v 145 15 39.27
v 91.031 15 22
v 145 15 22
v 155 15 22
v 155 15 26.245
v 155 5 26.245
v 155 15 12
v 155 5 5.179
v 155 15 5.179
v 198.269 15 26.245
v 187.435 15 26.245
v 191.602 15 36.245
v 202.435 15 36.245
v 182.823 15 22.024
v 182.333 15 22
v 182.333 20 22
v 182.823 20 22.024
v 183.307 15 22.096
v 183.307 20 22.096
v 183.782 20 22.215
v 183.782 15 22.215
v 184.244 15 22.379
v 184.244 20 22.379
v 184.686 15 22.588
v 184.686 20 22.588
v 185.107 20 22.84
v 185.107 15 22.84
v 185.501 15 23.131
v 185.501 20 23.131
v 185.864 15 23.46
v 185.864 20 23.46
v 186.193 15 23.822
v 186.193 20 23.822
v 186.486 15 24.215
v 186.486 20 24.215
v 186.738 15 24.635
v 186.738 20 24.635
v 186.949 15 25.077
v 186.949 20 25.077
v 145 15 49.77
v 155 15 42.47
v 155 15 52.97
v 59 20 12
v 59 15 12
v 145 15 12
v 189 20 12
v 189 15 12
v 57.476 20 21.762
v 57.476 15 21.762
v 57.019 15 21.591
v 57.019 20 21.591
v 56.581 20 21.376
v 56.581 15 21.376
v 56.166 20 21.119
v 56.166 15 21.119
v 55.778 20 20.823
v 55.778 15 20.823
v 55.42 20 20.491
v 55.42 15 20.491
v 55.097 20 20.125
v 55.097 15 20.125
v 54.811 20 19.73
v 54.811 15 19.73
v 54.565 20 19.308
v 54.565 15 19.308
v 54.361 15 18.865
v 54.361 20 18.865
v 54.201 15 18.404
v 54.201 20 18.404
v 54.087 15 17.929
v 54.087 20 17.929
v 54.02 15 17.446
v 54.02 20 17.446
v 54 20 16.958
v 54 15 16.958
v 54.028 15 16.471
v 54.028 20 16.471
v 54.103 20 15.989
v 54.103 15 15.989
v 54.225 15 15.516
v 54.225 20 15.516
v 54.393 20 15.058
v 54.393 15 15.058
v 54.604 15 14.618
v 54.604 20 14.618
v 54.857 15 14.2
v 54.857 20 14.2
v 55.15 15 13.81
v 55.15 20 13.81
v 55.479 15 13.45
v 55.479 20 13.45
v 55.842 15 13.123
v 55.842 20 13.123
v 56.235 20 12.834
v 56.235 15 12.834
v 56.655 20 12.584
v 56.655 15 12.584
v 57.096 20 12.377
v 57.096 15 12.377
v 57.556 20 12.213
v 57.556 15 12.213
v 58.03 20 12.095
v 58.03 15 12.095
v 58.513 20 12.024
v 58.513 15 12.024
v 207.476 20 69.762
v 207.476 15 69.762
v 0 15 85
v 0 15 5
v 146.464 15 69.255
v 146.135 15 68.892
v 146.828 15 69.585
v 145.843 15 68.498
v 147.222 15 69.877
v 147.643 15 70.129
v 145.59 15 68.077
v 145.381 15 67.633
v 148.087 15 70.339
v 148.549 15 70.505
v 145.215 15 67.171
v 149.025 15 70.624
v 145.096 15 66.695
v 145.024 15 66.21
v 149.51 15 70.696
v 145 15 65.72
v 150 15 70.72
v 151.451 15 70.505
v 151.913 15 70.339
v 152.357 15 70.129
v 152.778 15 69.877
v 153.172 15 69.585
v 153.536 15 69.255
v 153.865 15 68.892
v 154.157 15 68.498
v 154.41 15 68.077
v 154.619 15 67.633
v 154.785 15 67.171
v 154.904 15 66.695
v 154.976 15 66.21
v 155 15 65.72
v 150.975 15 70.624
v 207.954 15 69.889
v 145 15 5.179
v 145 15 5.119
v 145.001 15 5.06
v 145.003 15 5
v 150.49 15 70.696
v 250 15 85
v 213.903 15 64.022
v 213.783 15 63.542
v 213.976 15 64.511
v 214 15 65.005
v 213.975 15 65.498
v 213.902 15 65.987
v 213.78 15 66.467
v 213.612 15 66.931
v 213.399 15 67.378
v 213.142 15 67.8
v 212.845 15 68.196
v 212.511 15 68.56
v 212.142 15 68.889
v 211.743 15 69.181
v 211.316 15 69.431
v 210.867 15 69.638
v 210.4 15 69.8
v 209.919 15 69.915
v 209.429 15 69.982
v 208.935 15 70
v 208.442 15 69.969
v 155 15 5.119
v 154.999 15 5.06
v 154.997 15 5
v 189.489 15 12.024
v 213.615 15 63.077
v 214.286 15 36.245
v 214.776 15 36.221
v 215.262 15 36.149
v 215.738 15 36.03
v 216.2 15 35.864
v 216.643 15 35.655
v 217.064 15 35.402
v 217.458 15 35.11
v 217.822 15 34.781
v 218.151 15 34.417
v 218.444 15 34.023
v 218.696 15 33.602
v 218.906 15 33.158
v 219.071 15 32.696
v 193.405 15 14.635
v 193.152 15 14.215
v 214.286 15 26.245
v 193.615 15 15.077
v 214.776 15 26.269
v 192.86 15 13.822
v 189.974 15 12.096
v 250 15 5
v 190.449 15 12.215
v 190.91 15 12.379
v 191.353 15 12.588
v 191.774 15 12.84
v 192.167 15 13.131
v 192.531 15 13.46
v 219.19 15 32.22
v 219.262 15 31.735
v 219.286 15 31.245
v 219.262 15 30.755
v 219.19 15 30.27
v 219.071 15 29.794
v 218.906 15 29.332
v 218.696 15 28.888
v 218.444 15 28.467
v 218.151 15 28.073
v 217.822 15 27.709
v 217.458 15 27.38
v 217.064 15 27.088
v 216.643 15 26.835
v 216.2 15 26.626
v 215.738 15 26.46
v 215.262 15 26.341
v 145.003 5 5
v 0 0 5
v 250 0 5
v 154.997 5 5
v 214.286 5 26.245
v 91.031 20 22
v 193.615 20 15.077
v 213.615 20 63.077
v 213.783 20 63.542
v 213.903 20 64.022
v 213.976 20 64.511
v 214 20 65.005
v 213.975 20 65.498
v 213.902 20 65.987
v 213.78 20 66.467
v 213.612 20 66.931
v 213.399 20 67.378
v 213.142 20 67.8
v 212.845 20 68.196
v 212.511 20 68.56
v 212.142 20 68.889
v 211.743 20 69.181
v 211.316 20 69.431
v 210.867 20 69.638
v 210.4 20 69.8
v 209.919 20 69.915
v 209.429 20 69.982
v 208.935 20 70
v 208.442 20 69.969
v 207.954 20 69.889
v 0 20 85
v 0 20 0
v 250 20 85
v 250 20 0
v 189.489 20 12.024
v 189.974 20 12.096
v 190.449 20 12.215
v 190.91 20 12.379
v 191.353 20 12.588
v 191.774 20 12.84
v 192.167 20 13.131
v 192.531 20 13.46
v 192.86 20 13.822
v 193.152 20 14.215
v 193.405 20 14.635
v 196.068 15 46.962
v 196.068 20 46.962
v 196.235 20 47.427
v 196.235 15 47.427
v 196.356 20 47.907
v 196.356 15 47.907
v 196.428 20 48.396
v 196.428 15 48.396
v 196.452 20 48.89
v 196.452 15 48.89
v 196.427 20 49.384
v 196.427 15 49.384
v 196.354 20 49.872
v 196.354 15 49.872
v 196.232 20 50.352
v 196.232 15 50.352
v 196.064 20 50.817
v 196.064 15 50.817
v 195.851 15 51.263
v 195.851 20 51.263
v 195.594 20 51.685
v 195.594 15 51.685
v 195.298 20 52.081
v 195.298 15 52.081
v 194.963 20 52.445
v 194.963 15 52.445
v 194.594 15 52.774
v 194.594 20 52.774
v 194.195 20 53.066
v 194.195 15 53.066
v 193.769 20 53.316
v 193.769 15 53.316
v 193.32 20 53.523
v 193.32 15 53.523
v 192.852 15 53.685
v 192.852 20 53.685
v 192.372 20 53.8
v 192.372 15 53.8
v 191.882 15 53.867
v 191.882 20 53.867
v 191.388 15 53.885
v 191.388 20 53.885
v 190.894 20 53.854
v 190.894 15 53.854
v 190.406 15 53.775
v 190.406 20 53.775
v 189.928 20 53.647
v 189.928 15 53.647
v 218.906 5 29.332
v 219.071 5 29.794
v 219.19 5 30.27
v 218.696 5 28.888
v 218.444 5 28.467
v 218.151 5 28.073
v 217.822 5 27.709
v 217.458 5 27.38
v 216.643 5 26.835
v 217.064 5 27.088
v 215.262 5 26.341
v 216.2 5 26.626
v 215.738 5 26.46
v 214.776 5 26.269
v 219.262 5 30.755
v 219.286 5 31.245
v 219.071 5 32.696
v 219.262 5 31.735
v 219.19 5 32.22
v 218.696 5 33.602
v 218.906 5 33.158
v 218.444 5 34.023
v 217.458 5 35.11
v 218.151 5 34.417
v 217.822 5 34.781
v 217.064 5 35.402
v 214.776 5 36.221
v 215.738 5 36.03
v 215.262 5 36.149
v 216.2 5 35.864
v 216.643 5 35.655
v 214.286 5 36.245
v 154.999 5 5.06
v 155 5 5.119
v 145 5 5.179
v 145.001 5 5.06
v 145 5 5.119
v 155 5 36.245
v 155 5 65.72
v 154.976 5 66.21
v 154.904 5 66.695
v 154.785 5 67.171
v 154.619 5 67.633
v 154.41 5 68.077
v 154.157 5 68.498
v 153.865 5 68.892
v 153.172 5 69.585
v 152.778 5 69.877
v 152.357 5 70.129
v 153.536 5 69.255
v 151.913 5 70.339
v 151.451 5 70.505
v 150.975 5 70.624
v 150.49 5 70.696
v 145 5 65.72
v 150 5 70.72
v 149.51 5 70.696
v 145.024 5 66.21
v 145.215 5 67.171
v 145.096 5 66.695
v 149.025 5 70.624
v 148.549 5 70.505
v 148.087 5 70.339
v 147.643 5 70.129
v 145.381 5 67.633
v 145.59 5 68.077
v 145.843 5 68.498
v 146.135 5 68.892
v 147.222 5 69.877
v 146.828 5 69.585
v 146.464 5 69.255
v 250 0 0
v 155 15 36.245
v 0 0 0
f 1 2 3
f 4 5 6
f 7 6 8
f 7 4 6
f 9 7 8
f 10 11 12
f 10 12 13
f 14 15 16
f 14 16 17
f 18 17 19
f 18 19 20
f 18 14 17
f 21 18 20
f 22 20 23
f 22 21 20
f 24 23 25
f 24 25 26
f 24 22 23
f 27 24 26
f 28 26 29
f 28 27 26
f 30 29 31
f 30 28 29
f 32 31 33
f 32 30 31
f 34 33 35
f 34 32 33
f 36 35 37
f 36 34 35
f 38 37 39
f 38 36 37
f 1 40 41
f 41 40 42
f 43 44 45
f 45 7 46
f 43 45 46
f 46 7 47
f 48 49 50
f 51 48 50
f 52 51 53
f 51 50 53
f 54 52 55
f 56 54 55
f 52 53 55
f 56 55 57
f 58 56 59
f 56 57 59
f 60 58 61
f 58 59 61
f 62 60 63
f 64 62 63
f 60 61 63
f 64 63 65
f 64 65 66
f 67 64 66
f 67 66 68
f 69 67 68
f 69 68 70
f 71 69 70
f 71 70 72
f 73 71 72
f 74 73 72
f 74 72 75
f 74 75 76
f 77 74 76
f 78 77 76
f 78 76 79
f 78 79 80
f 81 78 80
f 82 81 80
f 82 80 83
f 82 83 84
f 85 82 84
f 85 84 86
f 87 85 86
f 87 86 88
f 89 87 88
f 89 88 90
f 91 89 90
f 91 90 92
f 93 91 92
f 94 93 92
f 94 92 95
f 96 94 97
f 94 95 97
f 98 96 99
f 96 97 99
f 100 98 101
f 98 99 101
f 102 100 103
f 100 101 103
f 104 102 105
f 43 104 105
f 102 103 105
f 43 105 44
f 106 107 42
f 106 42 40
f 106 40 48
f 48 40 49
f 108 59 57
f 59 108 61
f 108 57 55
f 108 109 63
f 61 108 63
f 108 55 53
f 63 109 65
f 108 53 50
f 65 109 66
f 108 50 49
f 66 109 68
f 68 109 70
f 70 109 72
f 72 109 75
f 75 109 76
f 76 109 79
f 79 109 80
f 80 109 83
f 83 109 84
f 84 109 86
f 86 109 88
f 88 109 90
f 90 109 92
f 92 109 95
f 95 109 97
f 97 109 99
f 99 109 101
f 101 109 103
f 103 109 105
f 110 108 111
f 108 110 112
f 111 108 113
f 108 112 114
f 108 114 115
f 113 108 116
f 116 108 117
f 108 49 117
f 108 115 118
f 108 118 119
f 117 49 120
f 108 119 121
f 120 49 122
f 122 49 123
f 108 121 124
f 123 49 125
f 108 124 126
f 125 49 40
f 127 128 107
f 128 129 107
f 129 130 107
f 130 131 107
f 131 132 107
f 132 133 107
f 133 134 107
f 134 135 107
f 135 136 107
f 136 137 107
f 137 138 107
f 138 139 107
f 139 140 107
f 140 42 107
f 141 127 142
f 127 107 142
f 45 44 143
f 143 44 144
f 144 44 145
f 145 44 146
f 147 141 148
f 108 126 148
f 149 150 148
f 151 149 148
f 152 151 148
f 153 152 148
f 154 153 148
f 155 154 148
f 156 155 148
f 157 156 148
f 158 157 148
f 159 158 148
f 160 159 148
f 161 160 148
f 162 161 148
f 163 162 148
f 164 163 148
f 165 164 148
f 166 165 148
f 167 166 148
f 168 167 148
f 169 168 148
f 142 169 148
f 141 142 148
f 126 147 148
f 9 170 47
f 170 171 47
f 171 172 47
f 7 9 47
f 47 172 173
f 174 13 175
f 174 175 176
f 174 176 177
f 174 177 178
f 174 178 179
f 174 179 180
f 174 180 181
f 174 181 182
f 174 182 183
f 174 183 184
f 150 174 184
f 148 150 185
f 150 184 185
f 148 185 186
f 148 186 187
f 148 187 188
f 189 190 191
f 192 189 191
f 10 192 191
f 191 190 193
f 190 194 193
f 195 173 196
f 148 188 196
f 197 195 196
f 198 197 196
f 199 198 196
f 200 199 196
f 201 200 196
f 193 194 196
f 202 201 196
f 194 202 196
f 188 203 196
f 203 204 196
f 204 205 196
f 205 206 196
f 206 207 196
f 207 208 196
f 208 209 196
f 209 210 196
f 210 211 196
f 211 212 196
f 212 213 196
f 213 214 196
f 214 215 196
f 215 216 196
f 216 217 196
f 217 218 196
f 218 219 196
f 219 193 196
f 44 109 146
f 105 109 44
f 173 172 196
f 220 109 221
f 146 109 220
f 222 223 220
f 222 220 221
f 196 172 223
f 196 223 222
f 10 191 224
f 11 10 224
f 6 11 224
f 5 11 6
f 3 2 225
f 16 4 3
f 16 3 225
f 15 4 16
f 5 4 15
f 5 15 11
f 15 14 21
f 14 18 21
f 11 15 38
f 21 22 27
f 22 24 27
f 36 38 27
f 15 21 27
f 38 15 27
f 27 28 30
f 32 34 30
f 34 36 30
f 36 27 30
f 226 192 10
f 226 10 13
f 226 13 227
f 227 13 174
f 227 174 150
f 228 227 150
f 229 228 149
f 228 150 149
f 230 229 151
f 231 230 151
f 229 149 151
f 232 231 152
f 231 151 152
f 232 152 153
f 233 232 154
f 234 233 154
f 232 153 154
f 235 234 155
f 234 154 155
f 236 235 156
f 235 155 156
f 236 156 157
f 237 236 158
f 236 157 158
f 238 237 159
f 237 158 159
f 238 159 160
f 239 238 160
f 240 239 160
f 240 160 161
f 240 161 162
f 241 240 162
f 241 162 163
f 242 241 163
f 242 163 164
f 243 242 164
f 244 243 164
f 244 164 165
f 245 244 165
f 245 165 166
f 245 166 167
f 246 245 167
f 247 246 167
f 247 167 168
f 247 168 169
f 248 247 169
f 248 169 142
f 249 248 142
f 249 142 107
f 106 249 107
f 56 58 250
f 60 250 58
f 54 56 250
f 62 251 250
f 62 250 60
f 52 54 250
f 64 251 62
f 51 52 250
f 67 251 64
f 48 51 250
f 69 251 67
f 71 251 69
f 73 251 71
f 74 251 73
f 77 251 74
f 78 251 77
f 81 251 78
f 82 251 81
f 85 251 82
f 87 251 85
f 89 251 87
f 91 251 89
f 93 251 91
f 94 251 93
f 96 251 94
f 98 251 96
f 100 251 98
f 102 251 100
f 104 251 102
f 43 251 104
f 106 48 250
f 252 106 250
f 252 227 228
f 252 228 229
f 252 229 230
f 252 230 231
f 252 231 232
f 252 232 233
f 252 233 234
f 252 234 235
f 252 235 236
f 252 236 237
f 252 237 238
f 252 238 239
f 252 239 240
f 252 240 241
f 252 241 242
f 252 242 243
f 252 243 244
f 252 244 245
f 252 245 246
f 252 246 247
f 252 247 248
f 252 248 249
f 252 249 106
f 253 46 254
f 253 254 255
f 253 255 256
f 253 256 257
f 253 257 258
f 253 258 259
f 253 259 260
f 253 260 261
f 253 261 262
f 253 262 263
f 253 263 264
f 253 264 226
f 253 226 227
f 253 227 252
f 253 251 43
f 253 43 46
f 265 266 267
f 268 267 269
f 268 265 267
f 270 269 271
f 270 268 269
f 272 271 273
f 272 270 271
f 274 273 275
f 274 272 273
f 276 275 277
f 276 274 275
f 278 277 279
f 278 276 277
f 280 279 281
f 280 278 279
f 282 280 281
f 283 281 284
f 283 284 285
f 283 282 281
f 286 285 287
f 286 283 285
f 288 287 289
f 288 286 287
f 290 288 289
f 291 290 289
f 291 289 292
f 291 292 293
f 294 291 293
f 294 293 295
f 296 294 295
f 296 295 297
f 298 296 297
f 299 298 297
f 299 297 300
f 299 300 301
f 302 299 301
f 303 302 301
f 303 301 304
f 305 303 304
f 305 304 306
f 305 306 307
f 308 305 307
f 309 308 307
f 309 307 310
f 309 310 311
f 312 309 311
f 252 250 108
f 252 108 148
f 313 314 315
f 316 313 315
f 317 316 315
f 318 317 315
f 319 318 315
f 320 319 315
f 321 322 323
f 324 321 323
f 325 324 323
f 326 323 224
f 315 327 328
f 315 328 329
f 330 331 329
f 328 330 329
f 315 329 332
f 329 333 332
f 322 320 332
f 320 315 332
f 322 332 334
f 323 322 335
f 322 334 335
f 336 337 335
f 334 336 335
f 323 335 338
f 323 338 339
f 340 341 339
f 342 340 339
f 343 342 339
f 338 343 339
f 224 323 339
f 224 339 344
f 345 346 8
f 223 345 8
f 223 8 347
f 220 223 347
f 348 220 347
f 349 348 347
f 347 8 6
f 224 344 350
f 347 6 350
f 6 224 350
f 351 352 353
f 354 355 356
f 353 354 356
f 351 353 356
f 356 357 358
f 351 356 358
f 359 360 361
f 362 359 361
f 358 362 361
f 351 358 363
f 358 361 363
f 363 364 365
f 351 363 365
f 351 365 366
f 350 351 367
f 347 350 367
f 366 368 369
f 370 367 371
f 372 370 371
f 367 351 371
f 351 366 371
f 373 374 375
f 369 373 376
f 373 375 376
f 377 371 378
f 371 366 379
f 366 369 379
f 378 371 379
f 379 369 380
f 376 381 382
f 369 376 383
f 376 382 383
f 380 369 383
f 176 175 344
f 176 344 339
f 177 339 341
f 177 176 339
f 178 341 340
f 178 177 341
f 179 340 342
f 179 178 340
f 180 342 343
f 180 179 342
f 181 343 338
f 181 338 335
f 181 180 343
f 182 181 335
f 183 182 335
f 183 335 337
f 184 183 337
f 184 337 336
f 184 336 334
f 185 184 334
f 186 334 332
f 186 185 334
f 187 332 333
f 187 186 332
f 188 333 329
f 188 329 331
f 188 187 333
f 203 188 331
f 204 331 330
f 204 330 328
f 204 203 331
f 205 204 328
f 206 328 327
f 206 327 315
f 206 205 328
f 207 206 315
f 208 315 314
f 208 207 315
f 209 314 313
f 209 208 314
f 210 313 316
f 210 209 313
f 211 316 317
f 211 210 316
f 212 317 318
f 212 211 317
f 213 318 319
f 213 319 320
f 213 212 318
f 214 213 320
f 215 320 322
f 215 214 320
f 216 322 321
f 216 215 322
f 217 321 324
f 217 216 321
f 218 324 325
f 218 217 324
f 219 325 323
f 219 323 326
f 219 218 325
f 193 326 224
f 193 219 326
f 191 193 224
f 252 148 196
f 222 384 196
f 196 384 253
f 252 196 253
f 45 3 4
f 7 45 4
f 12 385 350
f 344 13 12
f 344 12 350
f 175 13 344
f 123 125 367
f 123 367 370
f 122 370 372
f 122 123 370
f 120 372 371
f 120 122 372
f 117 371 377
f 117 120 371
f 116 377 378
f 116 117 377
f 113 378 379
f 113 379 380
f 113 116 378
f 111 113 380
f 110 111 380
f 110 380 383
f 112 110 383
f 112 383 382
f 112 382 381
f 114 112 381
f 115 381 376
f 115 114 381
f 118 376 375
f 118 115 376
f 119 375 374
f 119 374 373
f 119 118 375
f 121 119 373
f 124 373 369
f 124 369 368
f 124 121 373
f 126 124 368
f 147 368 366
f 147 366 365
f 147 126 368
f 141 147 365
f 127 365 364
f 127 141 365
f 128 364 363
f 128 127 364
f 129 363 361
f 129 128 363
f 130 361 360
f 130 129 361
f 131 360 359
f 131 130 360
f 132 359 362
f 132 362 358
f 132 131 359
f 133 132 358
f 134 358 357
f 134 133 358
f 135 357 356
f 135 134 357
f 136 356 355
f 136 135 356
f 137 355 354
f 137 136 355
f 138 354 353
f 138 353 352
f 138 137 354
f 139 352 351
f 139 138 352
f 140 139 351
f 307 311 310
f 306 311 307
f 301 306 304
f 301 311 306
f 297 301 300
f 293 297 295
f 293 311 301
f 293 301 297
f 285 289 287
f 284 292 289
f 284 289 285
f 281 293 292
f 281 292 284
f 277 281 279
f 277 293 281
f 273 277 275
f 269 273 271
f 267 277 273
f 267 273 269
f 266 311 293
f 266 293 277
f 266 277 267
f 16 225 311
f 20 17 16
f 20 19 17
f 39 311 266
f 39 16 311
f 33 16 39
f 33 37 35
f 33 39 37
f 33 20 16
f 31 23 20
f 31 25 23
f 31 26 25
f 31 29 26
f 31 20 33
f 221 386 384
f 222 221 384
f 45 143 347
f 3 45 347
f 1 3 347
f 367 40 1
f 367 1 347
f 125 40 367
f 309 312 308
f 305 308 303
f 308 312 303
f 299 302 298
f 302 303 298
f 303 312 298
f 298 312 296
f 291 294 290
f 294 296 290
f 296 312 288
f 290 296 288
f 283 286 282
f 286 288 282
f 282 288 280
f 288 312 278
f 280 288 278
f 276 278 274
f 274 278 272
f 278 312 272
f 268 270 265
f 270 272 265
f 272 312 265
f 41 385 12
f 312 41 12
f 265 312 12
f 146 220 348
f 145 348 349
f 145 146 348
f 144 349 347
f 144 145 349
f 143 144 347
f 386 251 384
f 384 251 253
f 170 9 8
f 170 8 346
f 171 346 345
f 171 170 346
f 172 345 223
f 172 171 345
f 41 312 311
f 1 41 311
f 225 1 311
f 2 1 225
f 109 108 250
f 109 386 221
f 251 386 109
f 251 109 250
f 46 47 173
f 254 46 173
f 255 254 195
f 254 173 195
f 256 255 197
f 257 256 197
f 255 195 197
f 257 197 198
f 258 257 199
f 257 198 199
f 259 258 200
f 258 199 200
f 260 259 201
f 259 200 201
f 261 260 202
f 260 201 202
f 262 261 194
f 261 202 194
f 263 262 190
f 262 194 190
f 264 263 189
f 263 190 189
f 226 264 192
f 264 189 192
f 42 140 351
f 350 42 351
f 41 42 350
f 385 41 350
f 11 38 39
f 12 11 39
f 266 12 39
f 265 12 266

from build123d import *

# Parameters (mm, degrees)
SKETCH1_W           = 250
SKETCH1_H           = 20
BOSS_EXTRUDE1_DEPTH = 5
SKETCH2_W           = 250
SKETCH2_H           = 5
BOSS_EXTRUDE2_DEPTH = 80
BOSS_EXTRUDE3_DEPTH = 10
CUT_EXTRUDE2_DEPTH  = 10


with BuildPart() as part:
    # Sketch1 → Boss-Extrude1 (new body)
    with BuildSketch(Plane.XY):
        with Locations((125, 10)):
            Rectangle(SKETCH1_W, SKETCH1_H)
    extrude(amount=BOSS_EXTRUDE1_DEPTH)

    # Sketch2 → Boss-Extrude2 (add)
    with BuildSketch(Plane.XY.offset(5)):
        with Locations((125, 17.5)):
            Rectangle(SKETCH2_W, SKETCH2_H)
    extrude(amount=BOSS_EXTRUDE2_DEPTH)

    # Sketch4 → Boss-Extrude3 (add)
    with BuildSketch(Plane.XZ.offset(-15)):
        with BuildLine():
            Line((145, 31.244995812), (145, 65.71985119))
            ThreePointArc((145, 65.71985119), (150, 70.71985119), (155, 65.71985119))
            Line((155, 65.71985119), (155, 36.244995812))
            Line((155, 36.244995812), (214.286235525, 36.244995812))
            ThreePointArc((214.286235525, 36.244995812), (219.286235525, 31.244995812), (214.286235525, 26.244995812))
            Line((214.286235525, 26.244995812), (155, 26.244995812))
            Line((155, 26.244995812), (155, 5.178641746))
            ThreePointArc((155, 5.178641746), (150, 0.178641746), (145, 5.178641746))
            Line((145, 5.178641746), (145, 31.244995812))
        make_face()
    extrude(amount=BOSS_EXTRUDE3_DEPTH)

    # Sketch3 → Cut-Extrude2 (cut)
    with BuildSketch(Plane.XZ.offset(-15)):
        with BuildLine():
            Line((207.476121364, 69.762120736), (57.476121364, 21.762120736))
            ThreePointArc((57.476121364, 21.762120736), (54.059827752, 16.228833248), (59, 12))
            Line((59, 12), (189, 12))
            ThreePointArc((189, 12), (191.773500981, 12.839748528), (193.615384615, 15.076923077))
            Line((193.615384615, 15.076923077), (213.615384615, 63.076923077))
            ThreePointArc((213.615384615, 63.076923077), (212.682705424, 68.381964039), (207.476121364, 69.762120736))
        make_face()
        with BuildLine():
            Line((189.928273384, 53.647285584), (91.030505936, 22))
            Line((91.030505936, 22), (182.333333333, 22))
            ThreePointArc((182.333333333, 22), (185.106834314, 22.839748528), (186.948717949, 25.076923077))
            Line((186.948717949, 25.076923077), (196.067536635, 46.962087925))
            ThreePointArc((196.067536635, 46.962087925), (195.134857444, 52.267128886), (189.928273384, 53.647285584))
        make_face(mode=Mode.SUBTRACT)
    extrude(amount=-CUT_EXTRUDE2_DEPTH, mode=Mode.SUBTRACT)


solid = part.part
